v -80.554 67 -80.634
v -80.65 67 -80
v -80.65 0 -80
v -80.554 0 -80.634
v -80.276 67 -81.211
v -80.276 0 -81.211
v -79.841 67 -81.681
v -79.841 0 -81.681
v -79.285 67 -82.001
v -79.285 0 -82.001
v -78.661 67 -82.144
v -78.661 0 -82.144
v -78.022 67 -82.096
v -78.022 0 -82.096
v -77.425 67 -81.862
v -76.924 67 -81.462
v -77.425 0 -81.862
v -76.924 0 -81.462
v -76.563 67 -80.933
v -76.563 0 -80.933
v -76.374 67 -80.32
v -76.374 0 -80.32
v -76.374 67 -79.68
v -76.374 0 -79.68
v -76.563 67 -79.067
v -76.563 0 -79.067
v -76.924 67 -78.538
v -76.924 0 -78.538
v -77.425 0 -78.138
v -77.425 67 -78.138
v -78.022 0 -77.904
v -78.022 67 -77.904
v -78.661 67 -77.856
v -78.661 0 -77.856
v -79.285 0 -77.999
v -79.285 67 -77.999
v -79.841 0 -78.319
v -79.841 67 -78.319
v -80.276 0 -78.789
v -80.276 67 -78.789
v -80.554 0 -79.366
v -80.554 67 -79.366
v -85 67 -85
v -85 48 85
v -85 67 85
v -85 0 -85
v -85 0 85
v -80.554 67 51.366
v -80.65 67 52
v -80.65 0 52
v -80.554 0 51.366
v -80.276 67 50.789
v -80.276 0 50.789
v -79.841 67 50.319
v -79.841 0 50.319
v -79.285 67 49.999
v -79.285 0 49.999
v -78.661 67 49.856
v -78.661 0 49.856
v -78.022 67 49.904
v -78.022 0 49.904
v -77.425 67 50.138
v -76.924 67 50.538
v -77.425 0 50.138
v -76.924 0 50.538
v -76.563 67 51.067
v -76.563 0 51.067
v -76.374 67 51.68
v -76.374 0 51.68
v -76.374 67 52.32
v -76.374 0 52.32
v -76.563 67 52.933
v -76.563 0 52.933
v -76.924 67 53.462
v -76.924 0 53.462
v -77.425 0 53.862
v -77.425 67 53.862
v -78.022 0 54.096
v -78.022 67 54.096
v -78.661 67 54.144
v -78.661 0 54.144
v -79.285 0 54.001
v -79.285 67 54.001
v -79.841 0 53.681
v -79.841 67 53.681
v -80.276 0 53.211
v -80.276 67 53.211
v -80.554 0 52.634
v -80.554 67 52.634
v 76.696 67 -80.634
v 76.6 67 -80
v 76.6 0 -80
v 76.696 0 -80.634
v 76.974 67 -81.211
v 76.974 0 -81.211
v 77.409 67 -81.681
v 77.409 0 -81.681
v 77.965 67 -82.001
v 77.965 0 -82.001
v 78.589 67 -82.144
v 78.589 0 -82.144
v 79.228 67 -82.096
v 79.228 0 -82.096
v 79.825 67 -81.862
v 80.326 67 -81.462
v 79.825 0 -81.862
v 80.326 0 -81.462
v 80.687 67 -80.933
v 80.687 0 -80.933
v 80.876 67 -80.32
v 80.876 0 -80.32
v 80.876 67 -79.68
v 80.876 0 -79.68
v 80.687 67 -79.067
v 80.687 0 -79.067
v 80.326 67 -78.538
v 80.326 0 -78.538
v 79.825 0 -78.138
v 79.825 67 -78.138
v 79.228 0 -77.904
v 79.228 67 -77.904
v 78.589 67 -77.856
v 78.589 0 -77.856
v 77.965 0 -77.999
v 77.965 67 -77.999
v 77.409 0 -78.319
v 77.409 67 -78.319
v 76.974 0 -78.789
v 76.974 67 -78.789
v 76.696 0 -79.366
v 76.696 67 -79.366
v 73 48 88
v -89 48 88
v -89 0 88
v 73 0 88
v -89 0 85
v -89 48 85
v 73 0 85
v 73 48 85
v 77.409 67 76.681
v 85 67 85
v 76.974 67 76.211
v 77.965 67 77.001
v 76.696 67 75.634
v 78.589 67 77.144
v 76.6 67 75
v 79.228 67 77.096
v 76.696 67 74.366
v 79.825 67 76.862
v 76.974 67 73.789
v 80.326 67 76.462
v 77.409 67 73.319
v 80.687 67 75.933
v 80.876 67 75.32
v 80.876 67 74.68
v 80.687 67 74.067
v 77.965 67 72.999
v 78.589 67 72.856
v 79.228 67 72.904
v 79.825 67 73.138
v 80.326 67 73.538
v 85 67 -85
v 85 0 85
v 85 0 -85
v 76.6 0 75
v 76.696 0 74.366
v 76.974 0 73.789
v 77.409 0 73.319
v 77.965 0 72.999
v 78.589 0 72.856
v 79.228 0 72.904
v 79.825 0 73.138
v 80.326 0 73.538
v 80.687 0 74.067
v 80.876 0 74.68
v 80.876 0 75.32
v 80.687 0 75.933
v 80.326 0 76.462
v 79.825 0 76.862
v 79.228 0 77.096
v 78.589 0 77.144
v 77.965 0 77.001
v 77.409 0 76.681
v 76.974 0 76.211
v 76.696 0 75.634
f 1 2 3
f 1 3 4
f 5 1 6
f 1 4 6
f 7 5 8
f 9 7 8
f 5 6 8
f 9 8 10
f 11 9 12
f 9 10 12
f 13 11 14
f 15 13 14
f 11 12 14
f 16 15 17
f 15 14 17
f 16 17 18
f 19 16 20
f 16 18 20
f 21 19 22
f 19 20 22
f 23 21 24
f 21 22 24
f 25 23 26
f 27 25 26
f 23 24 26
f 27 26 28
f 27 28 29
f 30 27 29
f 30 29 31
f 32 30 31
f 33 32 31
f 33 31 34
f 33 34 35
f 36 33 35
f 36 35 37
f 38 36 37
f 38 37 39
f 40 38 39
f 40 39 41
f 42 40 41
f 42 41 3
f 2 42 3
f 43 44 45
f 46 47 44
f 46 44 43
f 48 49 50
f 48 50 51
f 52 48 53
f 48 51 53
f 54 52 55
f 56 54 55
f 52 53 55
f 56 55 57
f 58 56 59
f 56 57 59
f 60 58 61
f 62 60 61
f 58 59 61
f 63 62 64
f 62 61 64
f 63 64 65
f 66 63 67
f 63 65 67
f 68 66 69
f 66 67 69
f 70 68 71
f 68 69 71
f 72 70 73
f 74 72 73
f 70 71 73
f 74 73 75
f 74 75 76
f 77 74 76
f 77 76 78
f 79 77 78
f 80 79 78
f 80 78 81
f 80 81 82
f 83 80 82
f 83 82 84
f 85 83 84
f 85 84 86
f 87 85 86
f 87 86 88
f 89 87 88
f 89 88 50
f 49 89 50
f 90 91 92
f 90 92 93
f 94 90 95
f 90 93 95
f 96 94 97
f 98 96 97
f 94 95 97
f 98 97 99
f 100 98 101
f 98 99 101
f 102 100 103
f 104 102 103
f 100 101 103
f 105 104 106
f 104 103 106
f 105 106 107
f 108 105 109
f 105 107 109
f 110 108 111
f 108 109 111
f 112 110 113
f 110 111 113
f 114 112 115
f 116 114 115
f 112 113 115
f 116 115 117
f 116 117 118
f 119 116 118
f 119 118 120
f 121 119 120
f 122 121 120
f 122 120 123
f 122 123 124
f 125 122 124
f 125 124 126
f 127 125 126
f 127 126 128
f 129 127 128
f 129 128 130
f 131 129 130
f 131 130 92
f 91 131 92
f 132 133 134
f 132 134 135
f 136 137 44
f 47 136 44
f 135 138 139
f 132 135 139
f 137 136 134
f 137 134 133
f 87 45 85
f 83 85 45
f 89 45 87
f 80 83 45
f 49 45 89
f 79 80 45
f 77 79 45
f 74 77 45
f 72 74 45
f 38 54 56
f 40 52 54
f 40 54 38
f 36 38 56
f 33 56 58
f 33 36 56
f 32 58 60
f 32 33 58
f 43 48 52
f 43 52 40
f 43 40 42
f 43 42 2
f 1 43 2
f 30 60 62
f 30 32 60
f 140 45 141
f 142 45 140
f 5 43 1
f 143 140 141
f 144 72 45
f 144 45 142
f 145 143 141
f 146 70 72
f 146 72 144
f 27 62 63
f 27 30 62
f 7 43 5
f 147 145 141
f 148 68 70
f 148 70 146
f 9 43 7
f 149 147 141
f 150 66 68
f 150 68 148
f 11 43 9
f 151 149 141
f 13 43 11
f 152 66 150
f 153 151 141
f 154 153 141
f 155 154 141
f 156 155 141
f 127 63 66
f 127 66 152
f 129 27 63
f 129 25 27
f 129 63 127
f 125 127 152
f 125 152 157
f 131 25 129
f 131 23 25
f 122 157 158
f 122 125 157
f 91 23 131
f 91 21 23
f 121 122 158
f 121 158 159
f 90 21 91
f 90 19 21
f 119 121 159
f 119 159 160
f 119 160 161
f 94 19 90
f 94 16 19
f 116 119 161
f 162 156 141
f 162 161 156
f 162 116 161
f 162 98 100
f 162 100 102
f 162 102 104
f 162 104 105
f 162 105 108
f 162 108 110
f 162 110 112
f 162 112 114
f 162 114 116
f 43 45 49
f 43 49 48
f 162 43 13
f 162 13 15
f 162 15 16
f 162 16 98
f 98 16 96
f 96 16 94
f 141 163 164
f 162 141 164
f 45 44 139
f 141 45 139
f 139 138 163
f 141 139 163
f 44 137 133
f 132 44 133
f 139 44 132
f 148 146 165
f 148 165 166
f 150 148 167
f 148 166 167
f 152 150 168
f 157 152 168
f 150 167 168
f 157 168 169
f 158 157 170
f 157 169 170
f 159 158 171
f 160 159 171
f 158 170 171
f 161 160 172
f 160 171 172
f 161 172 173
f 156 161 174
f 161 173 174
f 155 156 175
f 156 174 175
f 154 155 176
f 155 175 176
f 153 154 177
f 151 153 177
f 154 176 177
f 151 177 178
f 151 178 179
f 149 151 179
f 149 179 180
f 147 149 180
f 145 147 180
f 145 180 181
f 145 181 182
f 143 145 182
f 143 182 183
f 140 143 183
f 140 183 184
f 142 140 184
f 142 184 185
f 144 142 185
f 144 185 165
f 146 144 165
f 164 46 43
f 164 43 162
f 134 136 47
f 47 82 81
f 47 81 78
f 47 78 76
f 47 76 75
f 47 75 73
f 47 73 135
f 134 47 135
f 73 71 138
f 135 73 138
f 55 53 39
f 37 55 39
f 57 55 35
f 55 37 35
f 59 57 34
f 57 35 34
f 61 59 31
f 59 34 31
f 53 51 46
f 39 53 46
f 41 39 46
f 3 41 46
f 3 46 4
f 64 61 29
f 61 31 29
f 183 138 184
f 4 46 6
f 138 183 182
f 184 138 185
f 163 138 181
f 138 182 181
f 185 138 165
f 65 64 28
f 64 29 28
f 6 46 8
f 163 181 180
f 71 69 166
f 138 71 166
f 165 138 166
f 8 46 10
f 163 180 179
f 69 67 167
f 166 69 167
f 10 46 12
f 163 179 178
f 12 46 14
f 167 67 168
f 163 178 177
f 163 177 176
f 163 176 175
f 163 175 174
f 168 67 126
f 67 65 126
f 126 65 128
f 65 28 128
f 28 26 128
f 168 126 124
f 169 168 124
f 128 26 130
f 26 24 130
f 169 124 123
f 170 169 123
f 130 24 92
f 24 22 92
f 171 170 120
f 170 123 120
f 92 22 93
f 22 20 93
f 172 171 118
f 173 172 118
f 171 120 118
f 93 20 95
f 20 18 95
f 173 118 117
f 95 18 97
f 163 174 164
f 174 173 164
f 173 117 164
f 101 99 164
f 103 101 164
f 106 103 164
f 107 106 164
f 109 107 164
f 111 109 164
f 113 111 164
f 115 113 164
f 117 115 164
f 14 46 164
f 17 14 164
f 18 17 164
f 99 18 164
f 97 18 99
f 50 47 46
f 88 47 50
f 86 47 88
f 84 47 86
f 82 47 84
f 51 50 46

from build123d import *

# Parameters (mm, degrees)
SKETCH1_W            = 170
SKETCH1_H            = 170
BOSS_EXTRUDE1_DEPTH  = 67
SKETCH2_W            = 162
SKETCH2_H            = 48
BOSS_EXTRUDE2_DEPTH  = 3
M4_CLEARANCE_HOLE1_D = 4.3


with BuildPart() as part:
    # Sketch1 → Boss-Extrude1 (new body)
    with BuildSketch(Plane(origin=(0, 0, 0), x_dir=(1, 0, 0), z_dir=(0, 1, 0))):
        Rectangle(SKETCH1_W, SKETCH1_H)
    extrude(amount=BOSS_EXTRUDE1_DEPTH)

    # Sketch2 → Boss-Extrude2 (add)
    with BuildSketch(Plane.XY.offset(85)):
        with Locations((-8, 24)):
            Rectangle(SKETCH2_W, SKETCH2_H)
    extrude(amount=BOSS_EXTRUDE2_DEPTH)

    # M4 Clearance Hole1 (through all)
    with Locations(Plane(origin=(0, 67, 0), x_dir=(1, 0, 0), z_dir=(0, 1, 0))):
        with Locations((-78.5, 80), (-78.5, -52), (78.75, -75), (78.75, 80)):
            Hole(M4_CLEARANCE_HOLE1_D / 2)


solid = part.part
